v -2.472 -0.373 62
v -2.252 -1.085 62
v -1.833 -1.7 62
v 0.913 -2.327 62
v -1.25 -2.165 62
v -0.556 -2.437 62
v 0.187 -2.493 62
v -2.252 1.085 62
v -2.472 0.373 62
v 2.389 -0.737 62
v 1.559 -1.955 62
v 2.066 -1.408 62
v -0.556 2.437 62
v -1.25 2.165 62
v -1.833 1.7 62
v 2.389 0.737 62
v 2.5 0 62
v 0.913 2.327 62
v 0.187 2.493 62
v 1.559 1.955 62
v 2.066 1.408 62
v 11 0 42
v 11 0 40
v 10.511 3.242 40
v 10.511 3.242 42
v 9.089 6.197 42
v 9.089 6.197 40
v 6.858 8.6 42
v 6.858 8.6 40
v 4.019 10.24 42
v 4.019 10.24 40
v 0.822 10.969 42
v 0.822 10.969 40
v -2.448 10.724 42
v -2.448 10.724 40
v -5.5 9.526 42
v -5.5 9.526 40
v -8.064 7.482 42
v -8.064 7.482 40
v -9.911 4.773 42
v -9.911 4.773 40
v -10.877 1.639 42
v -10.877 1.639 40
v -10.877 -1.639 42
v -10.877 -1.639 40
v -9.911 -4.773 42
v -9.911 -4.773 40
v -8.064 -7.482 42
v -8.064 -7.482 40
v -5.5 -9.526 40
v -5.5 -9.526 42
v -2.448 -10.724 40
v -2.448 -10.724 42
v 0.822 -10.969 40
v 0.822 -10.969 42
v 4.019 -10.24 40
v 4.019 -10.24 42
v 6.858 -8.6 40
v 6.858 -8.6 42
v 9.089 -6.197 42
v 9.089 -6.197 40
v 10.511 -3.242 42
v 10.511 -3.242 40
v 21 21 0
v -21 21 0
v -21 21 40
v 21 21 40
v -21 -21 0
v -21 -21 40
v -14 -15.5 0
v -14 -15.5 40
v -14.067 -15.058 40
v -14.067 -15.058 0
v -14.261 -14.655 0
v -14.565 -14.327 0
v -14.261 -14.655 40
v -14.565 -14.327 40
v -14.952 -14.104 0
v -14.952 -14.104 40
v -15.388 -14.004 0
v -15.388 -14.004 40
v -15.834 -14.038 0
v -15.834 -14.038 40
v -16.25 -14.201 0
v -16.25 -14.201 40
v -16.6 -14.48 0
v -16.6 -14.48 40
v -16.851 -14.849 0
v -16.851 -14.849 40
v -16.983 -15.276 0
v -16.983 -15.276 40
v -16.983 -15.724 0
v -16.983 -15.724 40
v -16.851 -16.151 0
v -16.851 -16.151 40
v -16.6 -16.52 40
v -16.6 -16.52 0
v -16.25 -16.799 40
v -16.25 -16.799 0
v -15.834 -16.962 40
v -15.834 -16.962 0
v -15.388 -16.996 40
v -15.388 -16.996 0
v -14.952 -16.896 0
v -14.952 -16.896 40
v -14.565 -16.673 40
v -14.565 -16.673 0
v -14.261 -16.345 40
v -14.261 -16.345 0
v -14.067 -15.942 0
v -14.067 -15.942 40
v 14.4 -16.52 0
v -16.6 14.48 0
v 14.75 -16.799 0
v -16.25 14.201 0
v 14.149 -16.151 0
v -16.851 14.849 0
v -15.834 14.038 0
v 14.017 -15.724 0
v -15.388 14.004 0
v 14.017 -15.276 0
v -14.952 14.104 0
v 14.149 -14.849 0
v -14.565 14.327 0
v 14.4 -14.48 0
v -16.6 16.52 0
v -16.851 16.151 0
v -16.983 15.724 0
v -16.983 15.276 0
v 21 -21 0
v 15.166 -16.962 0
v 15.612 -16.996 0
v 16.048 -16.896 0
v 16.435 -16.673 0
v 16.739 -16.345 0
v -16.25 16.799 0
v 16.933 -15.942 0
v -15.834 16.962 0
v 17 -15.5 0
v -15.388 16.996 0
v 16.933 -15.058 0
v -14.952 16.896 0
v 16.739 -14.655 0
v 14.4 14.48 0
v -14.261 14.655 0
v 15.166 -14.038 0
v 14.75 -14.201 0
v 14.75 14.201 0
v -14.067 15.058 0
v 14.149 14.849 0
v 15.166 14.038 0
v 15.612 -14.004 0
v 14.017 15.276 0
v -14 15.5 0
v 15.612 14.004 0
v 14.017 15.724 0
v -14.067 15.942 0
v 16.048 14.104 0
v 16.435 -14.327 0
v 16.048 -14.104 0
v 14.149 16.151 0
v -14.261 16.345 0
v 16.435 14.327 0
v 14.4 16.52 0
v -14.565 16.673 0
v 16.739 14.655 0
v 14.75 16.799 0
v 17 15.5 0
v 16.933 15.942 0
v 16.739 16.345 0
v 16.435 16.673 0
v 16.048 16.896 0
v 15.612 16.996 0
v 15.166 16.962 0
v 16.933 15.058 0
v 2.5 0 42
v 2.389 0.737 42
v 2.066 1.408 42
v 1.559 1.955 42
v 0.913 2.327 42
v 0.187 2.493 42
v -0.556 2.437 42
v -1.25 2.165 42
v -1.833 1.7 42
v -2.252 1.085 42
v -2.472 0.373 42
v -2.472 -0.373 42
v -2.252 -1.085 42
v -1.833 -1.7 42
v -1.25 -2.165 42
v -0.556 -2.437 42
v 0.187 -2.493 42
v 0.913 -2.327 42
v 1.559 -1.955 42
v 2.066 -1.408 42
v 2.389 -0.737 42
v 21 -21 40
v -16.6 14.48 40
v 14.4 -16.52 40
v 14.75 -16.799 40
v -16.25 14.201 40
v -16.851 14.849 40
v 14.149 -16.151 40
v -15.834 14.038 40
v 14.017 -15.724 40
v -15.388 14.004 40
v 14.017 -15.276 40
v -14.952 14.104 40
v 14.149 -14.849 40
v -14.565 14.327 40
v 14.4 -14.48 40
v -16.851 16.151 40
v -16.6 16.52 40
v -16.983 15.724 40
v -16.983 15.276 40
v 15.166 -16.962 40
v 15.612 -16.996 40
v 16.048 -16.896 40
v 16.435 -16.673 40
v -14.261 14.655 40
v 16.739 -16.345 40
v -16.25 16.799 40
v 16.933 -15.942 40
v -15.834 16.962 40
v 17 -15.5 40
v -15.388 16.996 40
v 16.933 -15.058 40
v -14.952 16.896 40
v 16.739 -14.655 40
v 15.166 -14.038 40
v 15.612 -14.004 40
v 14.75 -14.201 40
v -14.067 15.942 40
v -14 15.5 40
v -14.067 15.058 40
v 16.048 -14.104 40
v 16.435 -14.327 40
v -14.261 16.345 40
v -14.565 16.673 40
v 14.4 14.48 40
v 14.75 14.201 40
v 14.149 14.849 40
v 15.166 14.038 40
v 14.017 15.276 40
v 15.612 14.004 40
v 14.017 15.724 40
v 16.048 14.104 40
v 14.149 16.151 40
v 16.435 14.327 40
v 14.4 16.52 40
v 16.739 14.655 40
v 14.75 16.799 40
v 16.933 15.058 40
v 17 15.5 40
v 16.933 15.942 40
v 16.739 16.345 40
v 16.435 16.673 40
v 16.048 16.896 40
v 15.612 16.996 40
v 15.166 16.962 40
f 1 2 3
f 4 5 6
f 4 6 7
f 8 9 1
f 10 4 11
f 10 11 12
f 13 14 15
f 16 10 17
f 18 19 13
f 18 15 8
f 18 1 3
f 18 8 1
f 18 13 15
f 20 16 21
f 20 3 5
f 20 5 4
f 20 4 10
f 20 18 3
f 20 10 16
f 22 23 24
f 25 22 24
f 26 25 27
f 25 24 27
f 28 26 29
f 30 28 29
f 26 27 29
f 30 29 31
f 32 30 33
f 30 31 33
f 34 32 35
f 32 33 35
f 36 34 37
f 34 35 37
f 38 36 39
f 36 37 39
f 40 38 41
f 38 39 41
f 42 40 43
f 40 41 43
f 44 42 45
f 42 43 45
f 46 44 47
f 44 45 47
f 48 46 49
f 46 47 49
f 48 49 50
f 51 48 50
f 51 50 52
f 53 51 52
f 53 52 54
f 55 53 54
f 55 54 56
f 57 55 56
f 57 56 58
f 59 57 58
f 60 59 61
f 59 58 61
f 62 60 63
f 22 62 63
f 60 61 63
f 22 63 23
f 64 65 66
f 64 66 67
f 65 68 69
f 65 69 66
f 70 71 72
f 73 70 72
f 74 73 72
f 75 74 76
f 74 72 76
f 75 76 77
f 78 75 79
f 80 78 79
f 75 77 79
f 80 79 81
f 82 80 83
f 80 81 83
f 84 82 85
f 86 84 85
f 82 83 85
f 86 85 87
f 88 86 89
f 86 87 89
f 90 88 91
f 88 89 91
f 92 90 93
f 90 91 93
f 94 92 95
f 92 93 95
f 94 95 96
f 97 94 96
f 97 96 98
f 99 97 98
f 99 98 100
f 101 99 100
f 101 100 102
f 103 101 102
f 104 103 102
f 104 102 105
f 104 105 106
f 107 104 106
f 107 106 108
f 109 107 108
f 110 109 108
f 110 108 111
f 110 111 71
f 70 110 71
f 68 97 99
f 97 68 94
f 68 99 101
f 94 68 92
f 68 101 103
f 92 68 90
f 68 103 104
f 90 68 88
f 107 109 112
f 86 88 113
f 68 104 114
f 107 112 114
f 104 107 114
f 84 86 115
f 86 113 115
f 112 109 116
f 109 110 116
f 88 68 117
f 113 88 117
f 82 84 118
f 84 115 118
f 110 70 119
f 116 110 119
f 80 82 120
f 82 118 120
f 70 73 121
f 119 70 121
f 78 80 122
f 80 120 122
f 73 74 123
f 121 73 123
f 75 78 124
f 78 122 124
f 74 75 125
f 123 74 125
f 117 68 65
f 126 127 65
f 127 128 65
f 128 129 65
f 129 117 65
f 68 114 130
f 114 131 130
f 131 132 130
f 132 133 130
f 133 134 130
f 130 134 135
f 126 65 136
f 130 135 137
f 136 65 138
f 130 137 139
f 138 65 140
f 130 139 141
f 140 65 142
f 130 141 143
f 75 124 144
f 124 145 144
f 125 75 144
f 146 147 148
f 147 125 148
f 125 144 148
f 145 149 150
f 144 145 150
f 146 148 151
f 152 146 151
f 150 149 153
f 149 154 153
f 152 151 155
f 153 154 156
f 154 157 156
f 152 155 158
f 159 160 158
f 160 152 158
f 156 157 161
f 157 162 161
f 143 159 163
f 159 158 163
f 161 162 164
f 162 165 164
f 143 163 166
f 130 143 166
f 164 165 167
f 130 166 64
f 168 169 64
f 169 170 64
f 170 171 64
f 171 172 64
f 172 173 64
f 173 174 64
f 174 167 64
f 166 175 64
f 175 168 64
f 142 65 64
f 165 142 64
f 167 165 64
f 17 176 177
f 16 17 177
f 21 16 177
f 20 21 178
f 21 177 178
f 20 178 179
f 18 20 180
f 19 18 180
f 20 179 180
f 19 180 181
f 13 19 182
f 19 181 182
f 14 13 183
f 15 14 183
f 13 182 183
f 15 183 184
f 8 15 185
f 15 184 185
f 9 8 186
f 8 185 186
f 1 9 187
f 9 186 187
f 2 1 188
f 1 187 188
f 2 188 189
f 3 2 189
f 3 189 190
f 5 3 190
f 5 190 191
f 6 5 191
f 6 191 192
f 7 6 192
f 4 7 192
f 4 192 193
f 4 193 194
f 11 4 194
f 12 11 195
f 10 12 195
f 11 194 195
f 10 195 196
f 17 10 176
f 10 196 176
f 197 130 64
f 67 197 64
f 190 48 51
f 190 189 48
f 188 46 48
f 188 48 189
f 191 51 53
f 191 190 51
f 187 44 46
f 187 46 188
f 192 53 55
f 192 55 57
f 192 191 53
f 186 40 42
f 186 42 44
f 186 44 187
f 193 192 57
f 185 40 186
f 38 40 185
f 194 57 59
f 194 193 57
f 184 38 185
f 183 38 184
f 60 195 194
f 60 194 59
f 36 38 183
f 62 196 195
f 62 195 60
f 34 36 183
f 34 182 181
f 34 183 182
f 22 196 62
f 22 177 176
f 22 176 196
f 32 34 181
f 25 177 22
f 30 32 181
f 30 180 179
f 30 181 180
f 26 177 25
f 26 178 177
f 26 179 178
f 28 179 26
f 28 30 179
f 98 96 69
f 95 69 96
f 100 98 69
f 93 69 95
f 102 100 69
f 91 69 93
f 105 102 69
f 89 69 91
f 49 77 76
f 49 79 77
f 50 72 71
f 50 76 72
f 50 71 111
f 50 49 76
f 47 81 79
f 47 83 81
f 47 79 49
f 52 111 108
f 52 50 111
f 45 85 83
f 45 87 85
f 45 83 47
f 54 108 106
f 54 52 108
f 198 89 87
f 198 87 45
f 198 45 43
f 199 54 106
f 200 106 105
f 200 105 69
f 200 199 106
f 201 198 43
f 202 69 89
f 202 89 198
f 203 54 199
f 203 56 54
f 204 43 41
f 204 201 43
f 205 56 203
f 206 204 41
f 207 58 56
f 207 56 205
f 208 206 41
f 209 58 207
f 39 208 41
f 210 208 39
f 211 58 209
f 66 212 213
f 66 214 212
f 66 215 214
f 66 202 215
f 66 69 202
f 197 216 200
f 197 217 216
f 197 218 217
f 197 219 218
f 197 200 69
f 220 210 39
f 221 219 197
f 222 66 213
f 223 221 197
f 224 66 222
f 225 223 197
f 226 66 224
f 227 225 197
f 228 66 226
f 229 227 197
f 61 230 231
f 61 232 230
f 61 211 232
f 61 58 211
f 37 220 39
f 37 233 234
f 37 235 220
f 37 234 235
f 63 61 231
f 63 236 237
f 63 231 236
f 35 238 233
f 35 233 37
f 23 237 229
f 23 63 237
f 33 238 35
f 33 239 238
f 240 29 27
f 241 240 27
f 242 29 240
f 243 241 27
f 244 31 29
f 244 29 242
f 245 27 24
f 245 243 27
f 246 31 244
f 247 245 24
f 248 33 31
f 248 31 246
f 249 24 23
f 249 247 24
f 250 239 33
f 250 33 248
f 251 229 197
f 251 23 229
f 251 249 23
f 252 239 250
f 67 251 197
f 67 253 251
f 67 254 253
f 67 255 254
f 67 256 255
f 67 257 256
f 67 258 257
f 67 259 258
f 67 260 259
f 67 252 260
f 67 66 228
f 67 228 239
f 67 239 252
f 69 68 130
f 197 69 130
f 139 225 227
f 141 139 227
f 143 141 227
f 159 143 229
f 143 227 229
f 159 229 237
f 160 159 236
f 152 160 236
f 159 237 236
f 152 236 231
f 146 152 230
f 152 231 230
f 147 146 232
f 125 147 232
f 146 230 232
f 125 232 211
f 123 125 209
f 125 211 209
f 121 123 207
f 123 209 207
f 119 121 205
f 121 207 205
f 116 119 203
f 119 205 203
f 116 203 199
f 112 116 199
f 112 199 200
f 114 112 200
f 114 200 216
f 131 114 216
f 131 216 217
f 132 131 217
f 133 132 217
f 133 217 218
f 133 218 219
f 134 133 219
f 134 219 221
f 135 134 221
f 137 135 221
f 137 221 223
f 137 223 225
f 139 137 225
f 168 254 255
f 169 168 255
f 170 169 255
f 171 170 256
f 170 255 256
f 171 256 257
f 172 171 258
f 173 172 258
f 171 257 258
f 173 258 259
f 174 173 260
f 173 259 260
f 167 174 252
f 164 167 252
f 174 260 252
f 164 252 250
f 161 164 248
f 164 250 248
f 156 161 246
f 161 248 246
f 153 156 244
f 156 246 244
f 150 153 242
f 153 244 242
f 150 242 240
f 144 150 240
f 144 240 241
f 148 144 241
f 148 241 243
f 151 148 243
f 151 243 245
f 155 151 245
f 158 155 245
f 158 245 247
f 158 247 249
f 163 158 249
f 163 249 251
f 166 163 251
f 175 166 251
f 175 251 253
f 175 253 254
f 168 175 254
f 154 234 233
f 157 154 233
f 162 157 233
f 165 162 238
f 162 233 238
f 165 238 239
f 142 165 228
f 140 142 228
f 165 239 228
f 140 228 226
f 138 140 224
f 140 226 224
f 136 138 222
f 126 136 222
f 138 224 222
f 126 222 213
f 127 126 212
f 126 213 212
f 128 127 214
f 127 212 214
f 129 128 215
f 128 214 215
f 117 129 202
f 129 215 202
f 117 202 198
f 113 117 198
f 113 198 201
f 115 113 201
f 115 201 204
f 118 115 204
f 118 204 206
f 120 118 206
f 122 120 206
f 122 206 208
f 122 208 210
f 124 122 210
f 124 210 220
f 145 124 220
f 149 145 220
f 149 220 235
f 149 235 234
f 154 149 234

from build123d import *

# Parameters (mm, degrees)
F0_W     = 42
F0_H     = 42
F0_R     = 11
F1_DEPTH = 40
F2_R     = 11
F3_DEPTH = 2
F4_R     = 2.5
F5_DEPTH = 20
F6_R     = 1.5
F7_DEPTH = 40.001


with BuildPart() as f1:
    # F0 (on Top) → F1 (new body)
    with BuildSketch(Plane.XY):
        Rectangle(F0_W, F0_H)
        Circle(F0_R, mode=Mode.SUBTRACT)
        Circle(F0_R)
    extrude(amount=F1_DEPTH)

    # F2 (on face) → F3 (join)
    with BuildSketch(Plane.XY.offset(40)):
        Circle(F2_R)
    extrude(amount=F3_DEPTH)

    # F4 (on face) → F5 (join)
    with BuildSketch(Plane.XY.offset(42)):
        Circle(F4_R)
    extrude(amount=F5_DEPTH)

    # F6 (on face) → F7 (cut, through all)
    with BuildSketch(Plane.XY.offset(40)):
        with Locations((-15.5, 15.5)):
            Circle(F6_R)
        with Locations((15.5, 15.5)):
            Circle(F6_R)
        with Locations((15.5, -15.5)):
            Circle(F6_R)
        with Locations((-15.5, -15.5)):
            Circle(F6_R)
    extrude(amount=-F7_DEPTH, mode=Mode.SUBTRACT)


solid = f1.part
